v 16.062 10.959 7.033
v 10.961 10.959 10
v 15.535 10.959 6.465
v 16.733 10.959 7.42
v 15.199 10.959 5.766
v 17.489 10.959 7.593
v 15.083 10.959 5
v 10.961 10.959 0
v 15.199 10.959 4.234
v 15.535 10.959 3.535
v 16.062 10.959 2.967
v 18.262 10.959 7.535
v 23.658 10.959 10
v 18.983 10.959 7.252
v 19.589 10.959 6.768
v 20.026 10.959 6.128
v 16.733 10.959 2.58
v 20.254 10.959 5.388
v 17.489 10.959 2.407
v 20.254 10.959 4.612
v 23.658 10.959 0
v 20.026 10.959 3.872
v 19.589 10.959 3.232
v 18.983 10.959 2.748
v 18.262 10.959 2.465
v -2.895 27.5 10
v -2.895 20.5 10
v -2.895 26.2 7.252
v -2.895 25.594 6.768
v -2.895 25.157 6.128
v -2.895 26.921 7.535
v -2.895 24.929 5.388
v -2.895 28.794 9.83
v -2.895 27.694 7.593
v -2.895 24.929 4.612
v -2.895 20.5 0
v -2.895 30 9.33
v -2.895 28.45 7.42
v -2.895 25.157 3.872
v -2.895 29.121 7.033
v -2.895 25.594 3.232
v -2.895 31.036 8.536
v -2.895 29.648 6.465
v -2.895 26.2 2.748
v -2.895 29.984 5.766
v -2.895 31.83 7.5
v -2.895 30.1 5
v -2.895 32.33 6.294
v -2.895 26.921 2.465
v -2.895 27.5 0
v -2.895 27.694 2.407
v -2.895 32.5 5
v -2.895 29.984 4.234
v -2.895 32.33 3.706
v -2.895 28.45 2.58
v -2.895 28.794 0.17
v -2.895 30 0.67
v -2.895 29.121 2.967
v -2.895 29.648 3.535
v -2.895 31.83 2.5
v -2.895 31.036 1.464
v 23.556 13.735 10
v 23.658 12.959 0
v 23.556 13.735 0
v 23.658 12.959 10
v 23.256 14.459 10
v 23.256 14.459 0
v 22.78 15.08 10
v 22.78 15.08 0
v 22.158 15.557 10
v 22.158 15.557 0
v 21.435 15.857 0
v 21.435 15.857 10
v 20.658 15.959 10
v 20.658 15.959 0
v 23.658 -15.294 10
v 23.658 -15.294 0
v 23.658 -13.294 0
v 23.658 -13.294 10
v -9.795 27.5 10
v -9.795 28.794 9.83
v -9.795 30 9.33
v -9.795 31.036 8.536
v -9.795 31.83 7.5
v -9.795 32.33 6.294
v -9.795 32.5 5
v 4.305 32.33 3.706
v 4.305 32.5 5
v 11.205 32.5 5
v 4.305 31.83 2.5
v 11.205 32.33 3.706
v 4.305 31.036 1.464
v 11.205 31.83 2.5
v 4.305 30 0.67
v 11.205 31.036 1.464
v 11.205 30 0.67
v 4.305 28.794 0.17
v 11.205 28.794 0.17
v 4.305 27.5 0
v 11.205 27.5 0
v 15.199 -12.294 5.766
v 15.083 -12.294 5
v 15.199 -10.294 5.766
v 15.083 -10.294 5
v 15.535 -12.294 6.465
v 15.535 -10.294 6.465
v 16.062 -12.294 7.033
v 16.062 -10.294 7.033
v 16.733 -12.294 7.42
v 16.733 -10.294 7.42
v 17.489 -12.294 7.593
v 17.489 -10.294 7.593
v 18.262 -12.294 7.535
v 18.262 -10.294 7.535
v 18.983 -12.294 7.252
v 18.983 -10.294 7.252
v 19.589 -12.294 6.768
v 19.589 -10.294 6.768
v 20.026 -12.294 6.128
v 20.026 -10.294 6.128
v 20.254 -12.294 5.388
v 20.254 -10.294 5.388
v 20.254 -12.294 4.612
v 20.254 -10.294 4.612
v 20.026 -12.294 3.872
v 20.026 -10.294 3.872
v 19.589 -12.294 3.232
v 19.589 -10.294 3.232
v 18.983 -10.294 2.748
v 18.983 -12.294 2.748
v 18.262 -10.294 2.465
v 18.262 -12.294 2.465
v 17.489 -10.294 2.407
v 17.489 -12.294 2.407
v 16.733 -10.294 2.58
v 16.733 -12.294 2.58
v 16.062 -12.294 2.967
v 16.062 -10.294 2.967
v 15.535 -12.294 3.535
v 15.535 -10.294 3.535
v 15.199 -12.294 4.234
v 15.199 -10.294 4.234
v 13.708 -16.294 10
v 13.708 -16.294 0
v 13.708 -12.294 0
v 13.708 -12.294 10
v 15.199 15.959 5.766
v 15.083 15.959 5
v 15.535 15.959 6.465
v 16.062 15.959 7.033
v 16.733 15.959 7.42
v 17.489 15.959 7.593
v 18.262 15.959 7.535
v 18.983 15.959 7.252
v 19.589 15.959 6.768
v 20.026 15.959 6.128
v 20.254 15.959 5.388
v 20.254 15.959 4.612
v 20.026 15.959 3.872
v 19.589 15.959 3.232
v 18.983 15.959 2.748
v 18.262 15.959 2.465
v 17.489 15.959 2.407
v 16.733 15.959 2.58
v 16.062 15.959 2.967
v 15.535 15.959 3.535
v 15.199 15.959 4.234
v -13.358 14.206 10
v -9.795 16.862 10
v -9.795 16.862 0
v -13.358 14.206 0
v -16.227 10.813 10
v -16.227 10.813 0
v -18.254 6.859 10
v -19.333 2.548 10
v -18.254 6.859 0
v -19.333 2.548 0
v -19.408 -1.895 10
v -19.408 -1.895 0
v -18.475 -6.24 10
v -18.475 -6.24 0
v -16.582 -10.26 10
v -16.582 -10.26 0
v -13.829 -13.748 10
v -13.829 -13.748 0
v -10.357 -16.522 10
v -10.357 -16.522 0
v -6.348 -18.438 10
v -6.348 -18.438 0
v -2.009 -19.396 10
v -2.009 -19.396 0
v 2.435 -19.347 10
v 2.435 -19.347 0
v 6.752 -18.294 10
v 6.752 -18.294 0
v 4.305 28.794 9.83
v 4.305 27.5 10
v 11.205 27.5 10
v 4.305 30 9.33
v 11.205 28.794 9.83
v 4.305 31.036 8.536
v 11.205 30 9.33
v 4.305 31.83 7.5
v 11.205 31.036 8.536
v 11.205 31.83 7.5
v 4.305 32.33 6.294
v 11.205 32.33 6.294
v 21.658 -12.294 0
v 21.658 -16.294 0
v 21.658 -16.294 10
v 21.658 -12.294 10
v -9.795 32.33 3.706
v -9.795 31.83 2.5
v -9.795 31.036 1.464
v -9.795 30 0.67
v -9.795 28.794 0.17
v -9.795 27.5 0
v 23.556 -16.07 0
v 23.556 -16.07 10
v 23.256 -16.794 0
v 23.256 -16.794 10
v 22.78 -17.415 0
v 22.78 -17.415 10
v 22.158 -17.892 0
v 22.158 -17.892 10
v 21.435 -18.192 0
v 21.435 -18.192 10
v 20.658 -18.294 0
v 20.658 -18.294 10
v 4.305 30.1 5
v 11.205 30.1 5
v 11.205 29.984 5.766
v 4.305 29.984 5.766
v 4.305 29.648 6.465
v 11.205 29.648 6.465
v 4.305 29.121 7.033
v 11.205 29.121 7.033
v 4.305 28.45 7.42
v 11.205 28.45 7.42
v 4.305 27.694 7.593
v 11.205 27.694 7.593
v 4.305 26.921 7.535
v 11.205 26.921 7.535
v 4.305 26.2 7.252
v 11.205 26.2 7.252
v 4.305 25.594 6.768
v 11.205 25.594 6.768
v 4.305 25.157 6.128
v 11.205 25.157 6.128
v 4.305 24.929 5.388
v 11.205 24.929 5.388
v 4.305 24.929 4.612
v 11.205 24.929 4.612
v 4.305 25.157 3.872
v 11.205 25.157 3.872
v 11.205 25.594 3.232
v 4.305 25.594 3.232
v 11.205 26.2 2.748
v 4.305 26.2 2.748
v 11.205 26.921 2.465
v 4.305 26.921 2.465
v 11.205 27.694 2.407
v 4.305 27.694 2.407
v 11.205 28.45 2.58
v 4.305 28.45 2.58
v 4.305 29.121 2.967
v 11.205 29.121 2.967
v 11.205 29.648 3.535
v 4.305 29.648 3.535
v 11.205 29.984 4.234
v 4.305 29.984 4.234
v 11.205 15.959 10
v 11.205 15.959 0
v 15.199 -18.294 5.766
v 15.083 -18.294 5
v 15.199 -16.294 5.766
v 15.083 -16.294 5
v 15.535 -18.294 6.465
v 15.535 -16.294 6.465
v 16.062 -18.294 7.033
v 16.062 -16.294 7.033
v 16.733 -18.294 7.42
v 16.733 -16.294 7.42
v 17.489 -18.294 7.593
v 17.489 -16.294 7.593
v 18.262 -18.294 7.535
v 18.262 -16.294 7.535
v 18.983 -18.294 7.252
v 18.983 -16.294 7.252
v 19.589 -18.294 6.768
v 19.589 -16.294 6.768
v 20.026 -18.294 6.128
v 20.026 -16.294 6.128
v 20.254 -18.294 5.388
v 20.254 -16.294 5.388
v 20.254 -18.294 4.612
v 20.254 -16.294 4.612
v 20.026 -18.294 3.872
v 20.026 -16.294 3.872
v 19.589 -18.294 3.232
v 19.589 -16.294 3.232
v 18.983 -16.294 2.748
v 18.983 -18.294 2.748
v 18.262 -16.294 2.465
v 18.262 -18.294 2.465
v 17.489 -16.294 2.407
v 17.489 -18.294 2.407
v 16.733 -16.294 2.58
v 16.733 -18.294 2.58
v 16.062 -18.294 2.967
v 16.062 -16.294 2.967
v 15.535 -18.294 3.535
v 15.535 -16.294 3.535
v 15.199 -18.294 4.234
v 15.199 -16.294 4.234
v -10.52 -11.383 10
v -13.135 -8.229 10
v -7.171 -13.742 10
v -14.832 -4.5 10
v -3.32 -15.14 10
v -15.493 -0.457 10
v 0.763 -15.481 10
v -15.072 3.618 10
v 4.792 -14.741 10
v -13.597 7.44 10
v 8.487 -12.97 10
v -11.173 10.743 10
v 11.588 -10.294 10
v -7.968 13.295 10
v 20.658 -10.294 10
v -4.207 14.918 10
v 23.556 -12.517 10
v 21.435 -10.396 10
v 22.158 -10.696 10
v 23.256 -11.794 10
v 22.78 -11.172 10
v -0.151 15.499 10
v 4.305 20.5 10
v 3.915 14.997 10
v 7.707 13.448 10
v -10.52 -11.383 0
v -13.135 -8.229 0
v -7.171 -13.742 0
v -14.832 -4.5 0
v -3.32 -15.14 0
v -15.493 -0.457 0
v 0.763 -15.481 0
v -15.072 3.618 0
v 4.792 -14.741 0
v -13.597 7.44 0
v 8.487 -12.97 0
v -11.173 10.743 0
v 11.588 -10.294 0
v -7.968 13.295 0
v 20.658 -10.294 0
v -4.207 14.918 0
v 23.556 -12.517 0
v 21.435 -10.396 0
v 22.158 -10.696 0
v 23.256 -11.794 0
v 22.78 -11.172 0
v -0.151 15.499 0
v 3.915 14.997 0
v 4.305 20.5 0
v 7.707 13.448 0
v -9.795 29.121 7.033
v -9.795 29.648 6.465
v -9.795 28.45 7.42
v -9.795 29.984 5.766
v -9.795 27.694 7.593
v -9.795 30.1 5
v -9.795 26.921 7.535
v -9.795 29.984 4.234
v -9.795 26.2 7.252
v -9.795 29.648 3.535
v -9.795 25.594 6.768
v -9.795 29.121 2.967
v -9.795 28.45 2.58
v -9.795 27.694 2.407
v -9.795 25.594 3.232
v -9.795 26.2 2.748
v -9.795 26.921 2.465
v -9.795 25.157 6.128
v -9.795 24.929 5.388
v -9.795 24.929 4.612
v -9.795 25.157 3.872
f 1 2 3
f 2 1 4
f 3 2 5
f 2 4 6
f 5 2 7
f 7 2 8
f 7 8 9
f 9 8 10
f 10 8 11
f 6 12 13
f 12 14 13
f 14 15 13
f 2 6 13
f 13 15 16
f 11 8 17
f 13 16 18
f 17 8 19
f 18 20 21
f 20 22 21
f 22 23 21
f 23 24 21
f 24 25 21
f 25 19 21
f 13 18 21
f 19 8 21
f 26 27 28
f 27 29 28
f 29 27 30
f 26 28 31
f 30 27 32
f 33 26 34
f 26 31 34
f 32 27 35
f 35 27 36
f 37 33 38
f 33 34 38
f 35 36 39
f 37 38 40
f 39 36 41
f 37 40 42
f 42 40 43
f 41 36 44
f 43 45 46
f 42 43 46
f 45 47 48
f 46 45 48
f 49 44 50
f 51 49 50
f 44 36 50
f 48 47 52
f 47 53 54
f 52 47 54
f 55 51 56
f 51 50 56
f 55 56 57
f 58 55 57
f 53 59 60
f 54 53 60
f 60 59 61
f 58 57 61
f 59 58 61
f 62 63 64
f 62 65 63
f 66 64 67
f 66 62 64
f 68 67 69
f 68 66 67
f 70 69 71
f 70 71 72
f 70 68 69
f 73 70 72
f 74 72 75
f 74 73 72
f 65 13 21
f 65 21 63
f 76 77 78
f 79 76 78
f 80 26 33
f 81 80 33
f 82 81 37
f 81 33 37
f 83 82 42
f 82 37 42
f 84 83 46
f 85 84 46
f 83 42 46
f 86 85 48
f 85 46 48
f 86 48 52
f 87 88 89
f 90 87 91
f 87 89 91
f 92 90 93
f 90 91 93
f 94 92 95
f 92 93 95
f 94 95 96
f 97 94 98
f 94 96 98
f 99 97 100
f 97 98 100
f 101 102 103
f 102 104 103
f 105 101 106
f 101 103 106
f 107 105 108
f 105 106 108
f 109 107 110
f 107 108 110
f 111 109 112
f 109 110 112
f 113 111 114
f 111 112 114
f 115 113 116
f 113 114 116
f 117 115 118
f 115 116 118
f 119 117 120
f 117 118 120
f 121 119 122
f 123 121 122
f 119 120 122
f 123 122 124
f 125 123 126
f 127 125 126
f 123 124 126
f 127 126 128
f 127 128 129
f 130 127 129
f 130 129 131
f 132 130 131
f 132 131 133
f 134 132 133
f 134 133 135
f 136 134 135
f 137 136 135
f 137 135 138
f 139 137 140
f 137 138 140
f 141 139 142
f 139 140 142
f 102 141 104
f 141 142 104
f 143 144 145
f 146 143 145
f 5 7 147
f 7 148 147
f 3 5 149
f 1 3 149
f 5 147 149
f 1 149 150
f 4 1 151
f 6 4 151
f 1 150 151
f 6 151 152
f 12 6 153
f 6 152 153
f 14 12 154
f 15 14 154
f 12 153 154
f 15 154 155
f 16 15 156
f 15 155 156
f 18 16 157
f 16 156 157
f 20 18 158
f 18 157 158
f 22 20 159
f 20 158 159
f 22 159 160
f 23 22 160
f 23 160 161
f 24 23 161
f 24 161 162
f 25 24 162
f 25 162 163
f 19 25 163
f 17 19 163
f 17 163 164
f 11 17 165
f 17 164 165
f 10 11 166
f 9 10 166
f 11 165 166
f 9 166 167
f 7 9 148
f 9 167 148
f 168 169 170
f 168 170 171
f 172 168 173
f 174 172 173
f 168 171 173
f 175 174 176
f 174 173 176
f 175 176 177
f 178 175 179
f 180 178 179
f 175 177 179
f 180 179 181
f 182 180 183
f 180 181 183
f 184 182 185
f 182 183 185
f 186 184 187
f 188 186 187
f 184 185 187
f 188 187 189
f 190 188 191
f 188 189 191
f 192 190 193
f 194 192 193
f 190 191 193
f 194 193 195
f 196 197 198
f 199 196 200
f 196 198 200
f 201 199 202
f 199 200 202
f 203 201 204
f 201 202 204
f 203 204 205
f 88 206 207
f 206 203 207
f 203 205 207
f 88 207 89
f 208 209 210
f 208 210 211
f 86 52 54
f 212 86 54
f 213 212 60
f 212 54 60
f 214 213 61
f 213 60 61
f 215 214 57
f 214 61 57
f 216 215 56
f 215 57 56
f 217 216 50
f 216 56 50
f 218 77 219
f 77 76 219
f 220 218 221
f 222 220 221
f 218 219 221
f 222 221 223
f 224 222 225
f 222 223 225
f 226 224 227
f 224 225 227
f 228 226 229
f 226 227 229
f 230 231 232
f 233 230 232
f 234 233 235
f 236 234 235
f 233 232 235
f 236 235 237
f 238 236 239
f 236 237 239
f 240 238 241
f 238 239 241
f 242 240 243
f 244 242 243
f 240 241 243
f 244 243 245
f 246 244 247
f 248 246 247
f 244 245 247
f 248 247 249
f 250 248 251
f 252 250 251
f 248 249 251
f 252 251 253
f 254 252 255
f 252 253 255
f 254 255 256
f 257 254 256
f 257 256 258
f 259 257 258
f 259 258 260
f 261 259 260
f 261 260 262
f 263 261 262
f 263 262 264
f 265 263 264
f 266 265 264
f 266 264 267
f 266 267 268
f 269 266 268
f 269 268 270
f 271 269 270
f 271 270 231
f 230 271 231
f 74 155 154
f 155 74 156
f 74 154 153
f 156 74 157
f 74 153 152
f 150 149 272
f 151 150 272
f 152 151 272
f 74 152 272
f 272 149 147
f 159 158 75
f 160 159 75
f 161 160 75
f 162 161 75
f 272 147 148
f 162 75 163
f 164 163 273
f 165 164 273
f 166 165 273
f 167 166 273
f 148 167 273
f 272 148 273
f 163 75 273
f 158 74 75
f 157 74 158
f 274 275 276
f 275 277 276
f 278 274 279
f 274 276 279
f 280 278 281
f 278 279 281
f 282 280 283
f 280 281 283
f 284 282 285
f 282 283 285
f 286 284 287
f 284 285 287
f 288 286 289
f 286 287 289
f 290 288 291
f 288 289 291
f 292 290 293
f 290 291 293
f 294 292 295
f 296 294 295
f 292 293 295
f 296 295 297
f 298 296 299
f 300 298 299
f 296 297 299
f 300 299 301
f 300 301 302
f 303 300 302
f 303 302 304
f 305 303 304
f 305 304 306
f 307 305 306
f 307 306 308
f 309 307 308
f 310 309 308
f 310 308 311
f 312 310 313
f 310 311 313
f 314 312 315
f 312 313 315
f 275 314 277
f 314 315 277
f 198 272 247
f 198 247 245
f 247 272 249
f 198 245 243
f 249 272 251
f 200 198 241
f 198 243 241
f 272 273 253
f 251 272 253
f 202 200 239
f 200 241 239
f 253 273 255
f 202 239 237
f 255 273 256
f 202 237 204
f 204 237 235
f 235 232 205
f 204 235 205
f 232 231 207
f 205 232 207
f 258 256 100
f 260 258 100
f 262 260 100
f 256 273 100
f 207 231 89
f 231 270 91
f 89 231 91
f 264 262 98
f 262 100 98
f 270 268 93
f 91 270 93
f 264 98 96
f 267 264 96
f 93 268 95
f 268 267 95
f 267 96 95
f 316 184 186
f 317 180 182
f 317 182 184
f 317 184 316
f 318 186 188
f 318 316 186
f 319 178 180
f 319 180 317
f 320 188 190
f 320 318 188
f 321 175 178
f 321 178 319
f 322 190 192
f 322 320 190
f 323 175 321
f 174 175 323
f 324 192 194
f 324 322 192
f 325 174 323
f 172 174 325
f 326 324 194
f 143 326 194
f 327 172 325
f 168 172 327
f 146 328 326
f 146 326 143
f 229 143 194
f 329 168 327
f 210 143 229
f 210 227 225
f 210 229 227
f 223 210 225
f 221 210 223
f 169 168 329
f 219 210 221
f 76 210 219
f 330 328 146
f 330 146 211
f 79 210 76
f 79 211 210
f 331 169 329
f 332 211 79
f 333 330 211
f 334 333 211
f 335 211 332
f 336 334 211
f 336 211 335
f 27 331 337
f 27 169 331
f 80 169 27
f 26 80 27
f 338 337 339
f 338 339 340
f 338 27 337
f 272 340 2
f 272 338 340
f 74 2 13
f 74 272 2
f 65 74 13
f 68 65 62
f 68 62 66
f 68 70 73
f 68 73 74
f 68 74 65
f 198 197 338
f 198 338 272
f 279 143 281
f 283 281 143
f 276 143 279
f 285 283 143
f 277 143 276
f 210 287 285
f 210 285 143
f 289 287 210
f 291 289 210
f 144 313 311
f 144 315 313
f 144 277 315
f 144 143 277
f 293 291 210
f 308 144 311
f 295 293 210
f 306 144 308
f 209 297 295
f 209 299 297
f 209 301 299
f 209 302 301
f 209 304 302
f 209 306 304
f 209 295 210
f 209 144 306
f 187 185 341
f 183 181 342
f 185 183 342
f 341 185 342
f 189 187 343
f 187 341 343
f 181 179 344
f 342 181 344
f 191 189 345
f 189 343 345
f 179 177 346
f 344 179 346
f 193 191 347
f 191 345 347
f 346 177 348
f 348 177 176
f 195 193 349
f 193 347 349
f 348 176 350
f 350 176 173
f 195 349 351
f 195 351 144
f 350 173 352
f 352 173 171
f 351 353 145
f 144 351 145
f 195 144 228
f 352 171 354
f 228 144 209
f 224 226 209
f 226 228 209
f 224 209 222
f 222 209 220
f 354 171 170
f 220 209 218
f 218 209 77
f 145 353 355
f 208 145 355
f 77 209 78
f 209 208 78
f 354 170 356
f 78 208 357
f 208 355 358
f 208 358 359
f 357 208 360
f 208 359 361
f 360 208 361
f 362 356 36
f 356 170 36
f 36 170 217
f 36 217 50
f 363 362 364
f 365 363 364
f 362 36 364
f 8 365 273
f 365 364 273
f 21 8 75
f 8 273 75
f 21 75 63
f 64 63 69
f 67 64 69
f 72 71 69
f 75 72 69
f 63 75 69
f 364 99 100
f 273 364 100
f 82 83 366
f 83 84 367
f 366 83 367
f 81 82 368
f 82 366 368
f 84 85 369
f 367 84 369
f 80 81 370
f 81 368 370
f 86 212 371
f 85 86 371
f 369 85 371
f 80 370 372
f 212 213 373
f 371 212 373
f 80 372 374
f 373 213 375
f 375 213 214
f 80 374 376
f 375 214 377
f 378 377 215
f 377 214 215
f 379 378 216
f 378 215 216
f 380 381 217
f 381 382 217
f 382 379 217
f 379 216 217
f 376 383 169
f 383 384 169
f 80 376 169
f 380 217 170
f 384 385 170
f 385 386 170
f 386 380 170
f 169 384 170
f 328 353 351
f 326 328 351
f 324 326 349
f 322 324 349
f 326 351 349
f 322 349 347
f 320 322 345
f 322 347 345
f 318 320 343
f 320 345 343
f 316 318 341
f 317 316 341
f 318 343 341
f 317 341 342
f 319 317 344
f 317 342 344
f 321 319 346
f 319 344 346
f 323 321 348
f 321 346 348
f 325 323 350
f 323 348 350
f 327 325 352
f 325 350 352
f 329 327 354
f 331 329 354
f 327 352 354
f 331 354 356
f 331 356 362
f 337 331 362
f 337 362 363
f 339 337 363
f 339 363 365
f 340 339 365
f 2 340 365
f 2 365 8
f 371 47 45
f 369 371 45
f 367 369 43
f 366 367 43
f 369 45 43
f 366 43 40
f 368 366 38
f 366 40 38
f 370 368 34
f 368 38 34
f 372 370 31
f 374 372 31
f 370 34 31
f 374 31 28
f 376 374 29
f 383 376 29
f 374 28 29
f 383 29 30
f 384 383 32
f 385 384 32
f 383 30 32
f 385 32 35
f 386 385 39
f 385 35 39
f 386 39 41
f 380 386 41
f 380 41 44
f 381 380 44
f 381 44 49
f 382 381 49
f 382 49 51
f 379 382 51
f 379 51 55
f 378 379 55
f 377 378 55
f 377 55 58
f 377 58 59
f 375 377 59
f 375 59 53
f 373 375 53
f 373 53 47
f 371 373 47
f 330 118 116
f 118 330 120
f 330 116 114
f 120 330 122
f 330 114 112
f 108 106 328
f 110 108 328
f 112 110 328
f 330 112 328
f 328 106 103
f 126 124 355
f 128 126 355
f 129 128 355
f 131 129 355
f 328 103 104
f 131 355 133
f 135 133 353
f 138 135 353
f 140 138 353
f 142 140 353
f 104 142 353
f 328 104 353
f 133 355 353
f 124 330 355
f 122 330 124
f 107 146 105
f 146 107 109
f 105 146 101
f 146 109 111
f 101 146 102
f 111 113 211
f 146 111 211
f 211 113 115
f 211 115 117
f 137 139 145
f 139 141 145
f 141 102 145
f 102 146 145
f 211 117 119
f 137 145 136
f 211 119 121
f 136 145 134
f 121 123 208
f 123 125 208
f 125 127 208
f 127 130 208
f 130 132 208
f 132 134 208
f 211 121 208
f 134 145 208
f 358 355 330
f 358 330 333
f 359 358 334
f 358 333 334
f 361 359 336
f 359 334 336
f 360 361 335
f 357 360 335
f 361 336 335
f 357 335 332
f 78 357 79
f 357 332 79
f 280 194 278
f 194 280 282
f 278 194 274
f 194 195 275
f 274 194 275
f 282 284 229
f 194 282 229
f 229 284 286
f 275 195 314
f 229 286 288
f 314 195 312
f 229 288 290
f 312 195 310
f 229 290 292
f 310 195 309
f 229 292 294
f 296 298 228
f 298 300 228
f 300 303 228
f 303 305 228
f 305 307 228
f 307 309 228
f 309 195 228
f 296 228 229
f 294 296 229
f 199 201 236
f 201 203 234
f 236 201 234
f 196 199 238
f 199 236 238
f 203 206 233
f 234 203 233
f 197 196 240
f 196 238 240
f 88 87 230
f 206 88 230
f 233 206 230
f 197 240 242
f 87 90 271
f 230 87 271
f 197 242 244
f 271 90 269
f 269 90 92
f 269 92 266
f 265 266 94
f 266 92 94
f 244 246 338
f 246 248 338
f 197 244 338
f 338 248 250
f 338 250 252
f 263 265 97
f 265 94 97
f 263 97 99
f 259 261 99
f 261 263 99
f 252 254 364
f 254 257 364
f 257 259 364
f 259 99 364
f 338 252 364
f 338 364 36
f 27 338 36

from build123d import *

# Parameters (mm, degrees)
F0_W     = 7.95
F0_H     = 4
F1_DEPTH = 10
F2_R     = 2.6
F3_DEPTH = 21
F4_R     = 2.6
F5_DEPTH = 50
F6_R     = 3


with BuildPart() as f1:
    # F0 (on Top) → F1 (new body)
    with BuildSketch(Plane.XY):
        with BuildLine():
            Line((23.658212, 10.958917), (23.658212, 15.958917))
            Line((23.658212, 15.958917), (11.205489, 15.958917))
            Line((11.205489, 15.958917), (11.205489, 32.5))
            Line((11.205489, 32.5), (4.305489, 32.5))
            Line((4.305489, 32.5), (4.305489, 20.5))
            Line((4.305489, 20.5), (-2.894511, 20.5))
            Line((-2.894511, 20.5), (-2.894511, 32.5))
            Line((-2.894511, 32.5), (-9.794511, 32.5))
            Line((-9.794511, 32.5), (-9.794511, 16.861718))
            ThreePointArc((-9.794511, 16.861718), (-17.643481, -8.304071), (6.751771, -18.293813))
            Line((6.751771, -18.293813), (12.970301, -18.293813))
            Line((12.970301, -18.293813), (23.658212, -18.293813))
            Line((23.658212, -18.293813), (23.658212, -10.293813))
            Line((23.658212, -10.293813), (11.588245, -10.293813))
            ThreePointArc((11.588245, -10.293813), (-15.493262, -0.456975), (10.961393, 10.958917))
            Line((10.961393, 10.958917), (23.658212, 10.958917))
        make_face()
        with Locations((17.683212, -14.293813)):
            Rectangle(F0_W, F0_H, mode=Mode.SUBTRACT)
    extrude(amount=F1_DEPTH)

    # F2 (on face) → F3 (cut, through all)
    with BuildSketch(Plane.YZ.offset(11.205489)):
        with BuildLine():
            ThreePointArc((32.5, 5), (31.035534, 1.464466), (27.5, 0))
            Line((27.5, 0), (32.5, 0))
            Line((32.5, 0), (32.5, 5))
        make_face()
        with BuildLine():
            ThreePointArc((27.5, 10), (31.035534, 8.535534), (32.5, 5))
            Line((32.5, 5), (32.5, 10))
            Line((32.5, 10), (27.5, 10))
        make_face()
        with Locations((27.5, 5)):
            Circle(F2_R)
    extrude(amount=-F3_DEPTH, mode=Mode.SUBTRACT)

    # F4 (on face) → F5 (cut, symmetric)
    with BuildSketch(Plane(origin=(0, -16.293813, 0), x_dir=(-1, 0, 0), z_dir=(0, 1, 0))):
        with Locations((-17.683212, 5)):
            Circle(F4_R)
    extrude(amount=F5_DEPTH, both=True, mode=Mode.SUBTRACT)

    # F6
    f6_edges = [f1.edges().sort_by_distance(p)[0] for p in [
        (23.658212, 15.958917, 5),
        (23.658212, -10.293813, 5),
        (23.658212, -18.293813, 5),
    ]]
    fillet(f6_edges, radius=F6_R)


solid = f1.part
